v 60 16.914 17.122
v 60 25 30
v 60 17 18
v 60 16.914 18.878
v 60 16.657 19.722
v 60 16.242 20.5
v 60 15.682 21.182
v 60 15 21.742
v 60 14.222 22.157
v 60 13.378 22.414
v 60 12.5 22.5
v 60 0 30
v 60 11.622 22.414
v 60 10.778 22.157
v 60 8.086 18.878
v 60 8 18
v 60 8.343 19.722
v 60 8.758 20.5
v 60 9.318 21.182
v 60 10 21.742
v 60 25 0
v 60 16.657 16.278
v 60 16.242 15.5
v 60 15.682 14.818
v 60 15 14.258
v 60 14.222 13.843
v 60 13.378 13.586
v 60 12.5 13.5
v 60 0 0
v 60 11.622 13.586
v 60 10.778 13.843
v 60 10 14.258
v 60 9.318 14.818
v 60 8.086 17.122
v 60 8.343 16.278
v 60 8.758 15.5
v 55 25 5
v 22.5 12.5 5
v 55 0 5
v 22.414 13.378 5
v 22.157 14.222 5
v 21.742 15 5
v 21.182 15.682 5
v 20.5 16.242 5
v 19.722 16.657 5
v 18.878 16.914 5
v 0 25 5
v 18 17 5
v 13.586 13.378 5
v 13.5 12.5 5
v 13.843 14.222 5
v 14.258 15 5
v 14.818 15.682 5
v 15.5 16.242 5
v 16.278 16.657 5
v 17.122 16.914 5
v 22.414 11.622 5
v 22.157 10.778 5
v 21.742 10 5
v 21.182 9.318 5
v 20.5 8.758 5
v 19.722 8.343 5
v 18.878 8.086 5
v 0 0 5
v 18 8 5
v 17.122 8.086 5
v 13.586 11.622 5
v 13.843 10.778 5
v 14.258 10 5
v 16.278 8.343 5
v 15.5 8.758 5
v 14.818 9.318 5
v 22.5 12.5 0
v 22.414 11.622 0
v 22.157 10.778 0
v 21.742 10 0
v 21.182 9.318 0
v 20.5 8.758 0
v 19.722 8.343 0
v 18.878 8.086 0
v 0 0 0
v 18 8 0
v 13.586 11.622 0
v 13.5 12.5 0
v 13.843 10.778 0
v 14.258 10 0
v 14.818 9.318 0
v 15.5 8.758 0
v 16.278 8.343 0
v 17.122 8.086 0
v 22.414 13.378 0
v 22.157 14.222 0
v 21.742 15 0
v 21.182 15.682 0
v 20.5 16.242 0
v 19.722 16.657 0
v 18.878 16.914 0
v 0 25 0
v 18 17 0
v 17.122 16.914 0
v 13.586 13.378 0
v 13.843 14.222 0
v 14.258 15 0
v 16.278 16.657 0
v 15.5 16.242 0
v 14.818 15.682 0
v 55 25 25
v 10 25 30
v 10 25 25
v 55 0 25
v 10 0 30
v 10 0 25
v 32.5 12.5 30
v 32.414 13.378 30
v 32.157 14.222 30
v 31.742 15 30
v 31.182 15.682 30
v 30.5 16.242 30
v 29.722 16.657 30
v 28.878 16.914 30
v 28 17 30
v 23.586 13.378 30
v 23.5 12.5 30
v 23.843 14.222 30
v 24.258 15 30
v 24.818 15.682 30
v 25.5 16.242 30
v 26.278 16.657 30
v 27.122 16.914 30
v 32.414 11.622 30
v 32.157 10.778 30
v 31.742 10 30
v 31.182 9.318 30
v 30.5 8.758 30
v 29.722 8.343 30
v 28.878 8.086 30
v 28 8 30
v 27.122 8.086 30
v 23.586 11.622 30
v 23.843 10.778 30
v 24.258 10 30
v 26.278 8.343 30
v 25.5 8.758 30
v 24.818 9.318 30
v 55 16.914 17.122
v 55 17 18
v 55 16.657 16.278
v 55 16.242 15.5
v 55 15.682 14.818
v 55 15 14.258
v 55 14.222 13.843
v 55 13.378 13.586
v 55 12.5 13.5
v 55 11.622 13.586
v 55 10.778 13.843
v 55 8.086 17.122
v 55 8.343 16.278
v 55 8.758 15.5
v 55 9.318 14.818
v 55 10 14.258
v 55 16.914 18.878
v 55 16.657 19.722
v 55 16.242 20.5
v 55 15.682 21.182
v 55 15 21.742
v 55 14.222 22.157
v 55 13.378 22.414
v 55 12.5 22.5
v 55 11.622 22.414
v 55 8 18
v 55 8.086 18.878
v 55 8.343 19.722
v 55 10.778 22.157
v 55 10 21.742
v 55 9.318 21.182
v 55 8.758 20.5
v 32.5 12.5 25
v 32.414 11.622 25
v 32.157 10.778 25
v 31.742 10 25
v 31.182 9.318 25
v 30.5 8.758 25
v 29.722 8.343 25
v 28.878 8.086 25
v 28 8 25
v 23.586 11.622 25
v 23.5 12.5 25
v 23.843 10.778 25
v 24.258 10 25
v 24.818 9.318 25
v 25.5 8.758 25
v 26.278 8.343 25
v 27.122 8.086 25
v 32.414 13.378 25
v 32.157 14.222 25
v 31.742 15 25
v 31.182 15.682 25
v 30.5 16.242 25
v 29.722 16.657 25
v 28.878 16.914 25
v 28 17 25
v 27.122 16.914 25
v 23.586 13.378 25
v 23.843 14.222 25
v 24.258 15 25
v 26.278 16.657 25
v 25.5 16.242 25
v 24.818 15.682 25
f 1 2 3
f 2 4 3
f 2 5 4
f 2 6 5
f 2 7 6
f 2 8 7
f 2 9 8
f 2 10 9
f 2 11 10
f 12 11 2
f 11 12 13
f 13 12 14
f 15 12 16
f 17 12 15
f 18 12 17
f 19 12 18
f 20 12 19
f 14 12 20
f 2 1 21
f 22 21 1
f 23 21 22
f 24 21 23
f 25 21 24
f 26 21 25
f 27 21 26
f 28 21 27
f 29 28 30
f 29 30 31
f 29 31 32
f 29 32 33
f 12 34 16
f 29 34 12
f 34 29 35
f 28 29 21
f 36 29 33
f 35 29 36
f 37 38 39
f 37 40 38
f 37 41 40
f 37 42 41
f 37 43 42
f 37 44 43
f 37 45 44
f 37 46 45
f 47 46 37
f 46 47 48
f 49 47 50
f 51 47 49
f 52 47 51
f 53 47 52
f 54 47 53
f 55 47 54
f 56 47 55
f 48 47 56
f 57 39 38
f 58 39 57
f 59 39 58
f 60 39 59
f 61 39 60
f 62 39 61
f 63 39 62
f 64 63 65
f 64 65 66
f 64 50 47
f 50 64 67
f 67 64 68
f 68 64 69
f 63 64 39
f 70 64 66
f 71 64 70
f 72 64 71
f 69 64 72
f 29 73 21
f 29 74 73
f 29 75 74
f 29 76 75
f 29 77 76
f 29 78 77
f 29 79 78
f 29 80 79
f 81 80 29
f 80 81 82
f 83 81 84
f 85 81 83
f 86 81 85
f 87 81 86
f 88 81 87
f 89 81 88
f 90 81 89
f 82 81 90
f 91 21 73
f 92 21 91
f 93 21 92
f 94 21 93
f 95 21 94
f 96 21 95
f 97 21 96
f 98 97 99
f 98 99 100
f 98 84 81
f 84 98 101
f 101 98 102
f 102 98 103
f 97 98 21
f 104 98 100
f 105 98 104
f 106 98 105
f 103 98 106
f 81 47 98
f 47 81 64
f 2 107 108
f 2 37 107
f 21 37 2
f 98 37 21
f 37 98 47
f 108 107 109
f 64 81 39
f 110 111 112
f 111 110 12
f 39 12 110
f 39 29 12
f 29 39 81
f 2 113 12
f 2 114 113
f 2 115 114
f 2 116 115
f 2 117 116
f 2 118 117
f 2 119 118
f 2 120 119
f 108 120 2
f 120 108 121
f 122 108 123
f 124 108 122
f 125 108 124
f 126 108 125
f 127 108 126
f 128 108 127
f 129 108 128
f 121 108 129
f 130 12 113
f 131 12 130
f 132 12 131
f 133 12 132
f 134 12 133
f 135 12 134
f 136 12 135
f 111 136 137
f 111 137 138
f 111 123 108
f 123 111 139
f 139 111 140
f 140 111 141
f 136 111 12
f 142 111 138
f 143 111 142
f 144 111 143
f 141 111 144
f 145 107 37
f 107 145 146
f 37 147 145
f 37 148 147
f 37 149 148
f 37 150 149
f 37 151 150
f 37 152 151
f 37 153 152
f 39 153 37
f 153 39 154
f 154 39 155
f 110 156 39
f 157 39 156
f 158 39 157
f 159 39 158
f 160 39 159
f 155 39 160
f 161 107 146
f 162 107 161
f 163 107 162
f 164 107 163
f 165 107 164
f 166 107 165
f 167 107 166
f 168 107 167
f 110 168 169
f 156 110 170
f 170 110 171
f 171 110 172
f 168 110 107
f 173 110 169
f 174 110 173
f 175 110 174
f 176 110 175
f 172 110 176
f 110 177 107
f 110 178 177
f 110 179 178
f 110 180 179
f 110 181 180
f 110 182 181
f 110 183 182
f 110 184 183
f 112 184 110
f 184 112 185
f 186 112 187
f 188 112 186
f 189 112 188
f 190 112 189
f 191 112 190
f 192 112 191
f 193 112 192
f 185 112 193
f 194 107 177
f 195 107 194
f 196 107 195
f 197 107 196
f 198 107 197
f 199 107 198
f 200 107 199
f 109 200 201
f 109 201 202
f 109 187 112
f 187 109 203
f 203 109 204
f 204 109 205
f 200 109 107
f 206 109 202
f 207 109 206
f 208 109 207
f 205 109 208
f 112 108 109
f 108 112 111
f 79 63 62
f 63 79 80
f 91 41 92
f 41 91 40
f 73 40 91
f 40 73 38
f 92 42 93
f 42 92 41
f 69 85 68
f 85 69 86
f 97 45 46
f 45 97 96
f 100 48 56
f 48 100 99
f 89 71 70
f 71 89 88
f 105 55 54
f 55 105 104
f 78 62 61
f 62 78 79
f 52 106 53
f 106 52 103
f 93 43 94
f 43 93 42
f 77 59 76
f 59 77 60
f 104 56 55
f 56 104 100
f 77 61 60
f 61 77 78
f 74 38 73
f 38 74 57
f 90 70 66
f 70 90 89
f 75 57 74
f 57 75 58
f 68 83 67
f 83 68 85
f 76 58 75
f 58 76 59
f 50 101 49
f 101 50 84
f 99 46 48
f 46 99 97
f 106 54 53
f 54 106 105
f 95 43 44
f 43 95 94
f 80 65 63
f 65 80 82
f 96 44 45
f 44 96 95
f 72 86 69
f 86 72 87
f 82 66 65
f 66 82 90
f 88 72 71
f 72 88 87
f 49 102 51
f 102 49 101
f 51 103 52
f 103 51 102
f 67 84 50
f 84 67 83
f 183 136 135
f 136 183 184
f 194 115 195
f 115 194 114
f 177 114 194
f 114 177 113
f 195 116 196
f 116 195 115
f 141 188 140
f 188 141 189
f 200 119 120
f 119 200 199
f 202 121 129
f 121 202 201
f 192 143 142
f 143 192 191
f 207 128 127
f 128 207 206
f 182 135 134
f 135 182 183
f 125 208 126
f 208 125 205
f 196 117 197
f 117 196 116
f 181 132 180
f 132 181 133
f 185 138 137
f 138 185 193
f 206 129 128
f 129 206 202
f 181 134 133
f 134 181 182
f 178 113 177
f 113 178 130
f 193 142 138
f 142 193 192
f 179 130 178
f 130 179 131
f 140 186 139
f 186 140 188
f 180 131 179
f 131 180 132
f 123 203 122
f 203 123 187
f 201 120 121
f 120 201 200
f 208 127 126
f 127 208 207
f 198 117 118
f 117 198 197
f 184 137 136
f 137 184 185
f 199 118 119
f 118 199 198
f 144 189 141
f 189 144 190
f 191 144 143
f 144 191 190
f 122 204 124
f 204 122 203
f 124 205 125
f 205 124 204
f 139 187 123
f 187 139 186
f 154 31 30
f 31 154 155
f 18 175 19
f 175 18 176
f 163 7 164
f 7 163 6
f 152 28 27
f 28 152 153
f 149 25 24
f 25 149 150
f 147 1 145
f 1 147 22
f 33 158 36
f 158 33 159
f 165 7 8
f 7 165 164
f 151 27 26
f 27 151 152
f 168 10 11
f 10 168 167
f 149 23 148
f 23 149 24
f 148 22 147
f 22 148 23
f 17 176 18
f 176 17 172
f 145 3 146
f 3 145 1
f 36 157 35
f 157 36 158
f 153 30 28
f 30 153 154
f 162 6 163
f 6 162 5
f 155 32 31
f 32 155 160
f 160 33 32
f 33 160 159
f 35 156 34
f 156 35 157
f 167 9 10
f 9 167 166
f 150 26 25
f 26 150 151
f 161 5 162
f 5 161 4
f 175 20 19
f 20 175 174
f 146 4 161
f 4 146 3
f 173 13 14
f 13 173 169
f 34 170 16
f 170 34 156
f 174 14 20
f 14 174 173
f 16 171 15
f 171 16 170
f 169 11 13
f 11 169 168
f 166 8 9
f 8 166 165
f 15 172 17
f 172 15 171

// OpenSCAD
$fn = 32;

// ----------------------------------------------------------------------
// Z-bracket: 60 x 25 x 30 mm
// ----------------------------------------------------------------------

// --- parameters (mm) ---
bottom_run = 60;          // lower foot length, X
top_run = 45;             // upper foot length, X
profile_w = 25;           // bracket width, Y
height = 30;              // overall rise, Z
mat_t = 5;                // plate thickness
hole_d = 9;               // clearance for M8

module hole_z(px, py, z0) {
  translate([px, py, z0 - 0.5]) cylinder(h = mat_t + 1, d = hole_d);
}
module hole_x(py, pz) {
  translate([-0.5, py, pz]) rotate([0, 90, 0]) cylinder(h = mat_t + 1, d = hole_d);
}

difference() {
  union() {
    cube([bottom_run, profile_w, mat_t]);
    /* web, overlapping the lower foot */
    translate([bottom_run - mat_t, 0, 0]) cube([mat_t, profile_w, height]);
    /* upper foot, sunk into the web */
    translate([bottom_run - mat_t - top_run, 0, height - mat_t]) cube([top_run + mat_t, profile_w, mat_t]);
  }
  hole_z(18, 12.5, 0);
  translate([bottom_run - mat_t - 27, 0, 0]) hole_z(0, 12.5, height - mat_t);
  translate([bottom_run - mat_t, 0, 0]) hole_x(12.5, 18);
}
